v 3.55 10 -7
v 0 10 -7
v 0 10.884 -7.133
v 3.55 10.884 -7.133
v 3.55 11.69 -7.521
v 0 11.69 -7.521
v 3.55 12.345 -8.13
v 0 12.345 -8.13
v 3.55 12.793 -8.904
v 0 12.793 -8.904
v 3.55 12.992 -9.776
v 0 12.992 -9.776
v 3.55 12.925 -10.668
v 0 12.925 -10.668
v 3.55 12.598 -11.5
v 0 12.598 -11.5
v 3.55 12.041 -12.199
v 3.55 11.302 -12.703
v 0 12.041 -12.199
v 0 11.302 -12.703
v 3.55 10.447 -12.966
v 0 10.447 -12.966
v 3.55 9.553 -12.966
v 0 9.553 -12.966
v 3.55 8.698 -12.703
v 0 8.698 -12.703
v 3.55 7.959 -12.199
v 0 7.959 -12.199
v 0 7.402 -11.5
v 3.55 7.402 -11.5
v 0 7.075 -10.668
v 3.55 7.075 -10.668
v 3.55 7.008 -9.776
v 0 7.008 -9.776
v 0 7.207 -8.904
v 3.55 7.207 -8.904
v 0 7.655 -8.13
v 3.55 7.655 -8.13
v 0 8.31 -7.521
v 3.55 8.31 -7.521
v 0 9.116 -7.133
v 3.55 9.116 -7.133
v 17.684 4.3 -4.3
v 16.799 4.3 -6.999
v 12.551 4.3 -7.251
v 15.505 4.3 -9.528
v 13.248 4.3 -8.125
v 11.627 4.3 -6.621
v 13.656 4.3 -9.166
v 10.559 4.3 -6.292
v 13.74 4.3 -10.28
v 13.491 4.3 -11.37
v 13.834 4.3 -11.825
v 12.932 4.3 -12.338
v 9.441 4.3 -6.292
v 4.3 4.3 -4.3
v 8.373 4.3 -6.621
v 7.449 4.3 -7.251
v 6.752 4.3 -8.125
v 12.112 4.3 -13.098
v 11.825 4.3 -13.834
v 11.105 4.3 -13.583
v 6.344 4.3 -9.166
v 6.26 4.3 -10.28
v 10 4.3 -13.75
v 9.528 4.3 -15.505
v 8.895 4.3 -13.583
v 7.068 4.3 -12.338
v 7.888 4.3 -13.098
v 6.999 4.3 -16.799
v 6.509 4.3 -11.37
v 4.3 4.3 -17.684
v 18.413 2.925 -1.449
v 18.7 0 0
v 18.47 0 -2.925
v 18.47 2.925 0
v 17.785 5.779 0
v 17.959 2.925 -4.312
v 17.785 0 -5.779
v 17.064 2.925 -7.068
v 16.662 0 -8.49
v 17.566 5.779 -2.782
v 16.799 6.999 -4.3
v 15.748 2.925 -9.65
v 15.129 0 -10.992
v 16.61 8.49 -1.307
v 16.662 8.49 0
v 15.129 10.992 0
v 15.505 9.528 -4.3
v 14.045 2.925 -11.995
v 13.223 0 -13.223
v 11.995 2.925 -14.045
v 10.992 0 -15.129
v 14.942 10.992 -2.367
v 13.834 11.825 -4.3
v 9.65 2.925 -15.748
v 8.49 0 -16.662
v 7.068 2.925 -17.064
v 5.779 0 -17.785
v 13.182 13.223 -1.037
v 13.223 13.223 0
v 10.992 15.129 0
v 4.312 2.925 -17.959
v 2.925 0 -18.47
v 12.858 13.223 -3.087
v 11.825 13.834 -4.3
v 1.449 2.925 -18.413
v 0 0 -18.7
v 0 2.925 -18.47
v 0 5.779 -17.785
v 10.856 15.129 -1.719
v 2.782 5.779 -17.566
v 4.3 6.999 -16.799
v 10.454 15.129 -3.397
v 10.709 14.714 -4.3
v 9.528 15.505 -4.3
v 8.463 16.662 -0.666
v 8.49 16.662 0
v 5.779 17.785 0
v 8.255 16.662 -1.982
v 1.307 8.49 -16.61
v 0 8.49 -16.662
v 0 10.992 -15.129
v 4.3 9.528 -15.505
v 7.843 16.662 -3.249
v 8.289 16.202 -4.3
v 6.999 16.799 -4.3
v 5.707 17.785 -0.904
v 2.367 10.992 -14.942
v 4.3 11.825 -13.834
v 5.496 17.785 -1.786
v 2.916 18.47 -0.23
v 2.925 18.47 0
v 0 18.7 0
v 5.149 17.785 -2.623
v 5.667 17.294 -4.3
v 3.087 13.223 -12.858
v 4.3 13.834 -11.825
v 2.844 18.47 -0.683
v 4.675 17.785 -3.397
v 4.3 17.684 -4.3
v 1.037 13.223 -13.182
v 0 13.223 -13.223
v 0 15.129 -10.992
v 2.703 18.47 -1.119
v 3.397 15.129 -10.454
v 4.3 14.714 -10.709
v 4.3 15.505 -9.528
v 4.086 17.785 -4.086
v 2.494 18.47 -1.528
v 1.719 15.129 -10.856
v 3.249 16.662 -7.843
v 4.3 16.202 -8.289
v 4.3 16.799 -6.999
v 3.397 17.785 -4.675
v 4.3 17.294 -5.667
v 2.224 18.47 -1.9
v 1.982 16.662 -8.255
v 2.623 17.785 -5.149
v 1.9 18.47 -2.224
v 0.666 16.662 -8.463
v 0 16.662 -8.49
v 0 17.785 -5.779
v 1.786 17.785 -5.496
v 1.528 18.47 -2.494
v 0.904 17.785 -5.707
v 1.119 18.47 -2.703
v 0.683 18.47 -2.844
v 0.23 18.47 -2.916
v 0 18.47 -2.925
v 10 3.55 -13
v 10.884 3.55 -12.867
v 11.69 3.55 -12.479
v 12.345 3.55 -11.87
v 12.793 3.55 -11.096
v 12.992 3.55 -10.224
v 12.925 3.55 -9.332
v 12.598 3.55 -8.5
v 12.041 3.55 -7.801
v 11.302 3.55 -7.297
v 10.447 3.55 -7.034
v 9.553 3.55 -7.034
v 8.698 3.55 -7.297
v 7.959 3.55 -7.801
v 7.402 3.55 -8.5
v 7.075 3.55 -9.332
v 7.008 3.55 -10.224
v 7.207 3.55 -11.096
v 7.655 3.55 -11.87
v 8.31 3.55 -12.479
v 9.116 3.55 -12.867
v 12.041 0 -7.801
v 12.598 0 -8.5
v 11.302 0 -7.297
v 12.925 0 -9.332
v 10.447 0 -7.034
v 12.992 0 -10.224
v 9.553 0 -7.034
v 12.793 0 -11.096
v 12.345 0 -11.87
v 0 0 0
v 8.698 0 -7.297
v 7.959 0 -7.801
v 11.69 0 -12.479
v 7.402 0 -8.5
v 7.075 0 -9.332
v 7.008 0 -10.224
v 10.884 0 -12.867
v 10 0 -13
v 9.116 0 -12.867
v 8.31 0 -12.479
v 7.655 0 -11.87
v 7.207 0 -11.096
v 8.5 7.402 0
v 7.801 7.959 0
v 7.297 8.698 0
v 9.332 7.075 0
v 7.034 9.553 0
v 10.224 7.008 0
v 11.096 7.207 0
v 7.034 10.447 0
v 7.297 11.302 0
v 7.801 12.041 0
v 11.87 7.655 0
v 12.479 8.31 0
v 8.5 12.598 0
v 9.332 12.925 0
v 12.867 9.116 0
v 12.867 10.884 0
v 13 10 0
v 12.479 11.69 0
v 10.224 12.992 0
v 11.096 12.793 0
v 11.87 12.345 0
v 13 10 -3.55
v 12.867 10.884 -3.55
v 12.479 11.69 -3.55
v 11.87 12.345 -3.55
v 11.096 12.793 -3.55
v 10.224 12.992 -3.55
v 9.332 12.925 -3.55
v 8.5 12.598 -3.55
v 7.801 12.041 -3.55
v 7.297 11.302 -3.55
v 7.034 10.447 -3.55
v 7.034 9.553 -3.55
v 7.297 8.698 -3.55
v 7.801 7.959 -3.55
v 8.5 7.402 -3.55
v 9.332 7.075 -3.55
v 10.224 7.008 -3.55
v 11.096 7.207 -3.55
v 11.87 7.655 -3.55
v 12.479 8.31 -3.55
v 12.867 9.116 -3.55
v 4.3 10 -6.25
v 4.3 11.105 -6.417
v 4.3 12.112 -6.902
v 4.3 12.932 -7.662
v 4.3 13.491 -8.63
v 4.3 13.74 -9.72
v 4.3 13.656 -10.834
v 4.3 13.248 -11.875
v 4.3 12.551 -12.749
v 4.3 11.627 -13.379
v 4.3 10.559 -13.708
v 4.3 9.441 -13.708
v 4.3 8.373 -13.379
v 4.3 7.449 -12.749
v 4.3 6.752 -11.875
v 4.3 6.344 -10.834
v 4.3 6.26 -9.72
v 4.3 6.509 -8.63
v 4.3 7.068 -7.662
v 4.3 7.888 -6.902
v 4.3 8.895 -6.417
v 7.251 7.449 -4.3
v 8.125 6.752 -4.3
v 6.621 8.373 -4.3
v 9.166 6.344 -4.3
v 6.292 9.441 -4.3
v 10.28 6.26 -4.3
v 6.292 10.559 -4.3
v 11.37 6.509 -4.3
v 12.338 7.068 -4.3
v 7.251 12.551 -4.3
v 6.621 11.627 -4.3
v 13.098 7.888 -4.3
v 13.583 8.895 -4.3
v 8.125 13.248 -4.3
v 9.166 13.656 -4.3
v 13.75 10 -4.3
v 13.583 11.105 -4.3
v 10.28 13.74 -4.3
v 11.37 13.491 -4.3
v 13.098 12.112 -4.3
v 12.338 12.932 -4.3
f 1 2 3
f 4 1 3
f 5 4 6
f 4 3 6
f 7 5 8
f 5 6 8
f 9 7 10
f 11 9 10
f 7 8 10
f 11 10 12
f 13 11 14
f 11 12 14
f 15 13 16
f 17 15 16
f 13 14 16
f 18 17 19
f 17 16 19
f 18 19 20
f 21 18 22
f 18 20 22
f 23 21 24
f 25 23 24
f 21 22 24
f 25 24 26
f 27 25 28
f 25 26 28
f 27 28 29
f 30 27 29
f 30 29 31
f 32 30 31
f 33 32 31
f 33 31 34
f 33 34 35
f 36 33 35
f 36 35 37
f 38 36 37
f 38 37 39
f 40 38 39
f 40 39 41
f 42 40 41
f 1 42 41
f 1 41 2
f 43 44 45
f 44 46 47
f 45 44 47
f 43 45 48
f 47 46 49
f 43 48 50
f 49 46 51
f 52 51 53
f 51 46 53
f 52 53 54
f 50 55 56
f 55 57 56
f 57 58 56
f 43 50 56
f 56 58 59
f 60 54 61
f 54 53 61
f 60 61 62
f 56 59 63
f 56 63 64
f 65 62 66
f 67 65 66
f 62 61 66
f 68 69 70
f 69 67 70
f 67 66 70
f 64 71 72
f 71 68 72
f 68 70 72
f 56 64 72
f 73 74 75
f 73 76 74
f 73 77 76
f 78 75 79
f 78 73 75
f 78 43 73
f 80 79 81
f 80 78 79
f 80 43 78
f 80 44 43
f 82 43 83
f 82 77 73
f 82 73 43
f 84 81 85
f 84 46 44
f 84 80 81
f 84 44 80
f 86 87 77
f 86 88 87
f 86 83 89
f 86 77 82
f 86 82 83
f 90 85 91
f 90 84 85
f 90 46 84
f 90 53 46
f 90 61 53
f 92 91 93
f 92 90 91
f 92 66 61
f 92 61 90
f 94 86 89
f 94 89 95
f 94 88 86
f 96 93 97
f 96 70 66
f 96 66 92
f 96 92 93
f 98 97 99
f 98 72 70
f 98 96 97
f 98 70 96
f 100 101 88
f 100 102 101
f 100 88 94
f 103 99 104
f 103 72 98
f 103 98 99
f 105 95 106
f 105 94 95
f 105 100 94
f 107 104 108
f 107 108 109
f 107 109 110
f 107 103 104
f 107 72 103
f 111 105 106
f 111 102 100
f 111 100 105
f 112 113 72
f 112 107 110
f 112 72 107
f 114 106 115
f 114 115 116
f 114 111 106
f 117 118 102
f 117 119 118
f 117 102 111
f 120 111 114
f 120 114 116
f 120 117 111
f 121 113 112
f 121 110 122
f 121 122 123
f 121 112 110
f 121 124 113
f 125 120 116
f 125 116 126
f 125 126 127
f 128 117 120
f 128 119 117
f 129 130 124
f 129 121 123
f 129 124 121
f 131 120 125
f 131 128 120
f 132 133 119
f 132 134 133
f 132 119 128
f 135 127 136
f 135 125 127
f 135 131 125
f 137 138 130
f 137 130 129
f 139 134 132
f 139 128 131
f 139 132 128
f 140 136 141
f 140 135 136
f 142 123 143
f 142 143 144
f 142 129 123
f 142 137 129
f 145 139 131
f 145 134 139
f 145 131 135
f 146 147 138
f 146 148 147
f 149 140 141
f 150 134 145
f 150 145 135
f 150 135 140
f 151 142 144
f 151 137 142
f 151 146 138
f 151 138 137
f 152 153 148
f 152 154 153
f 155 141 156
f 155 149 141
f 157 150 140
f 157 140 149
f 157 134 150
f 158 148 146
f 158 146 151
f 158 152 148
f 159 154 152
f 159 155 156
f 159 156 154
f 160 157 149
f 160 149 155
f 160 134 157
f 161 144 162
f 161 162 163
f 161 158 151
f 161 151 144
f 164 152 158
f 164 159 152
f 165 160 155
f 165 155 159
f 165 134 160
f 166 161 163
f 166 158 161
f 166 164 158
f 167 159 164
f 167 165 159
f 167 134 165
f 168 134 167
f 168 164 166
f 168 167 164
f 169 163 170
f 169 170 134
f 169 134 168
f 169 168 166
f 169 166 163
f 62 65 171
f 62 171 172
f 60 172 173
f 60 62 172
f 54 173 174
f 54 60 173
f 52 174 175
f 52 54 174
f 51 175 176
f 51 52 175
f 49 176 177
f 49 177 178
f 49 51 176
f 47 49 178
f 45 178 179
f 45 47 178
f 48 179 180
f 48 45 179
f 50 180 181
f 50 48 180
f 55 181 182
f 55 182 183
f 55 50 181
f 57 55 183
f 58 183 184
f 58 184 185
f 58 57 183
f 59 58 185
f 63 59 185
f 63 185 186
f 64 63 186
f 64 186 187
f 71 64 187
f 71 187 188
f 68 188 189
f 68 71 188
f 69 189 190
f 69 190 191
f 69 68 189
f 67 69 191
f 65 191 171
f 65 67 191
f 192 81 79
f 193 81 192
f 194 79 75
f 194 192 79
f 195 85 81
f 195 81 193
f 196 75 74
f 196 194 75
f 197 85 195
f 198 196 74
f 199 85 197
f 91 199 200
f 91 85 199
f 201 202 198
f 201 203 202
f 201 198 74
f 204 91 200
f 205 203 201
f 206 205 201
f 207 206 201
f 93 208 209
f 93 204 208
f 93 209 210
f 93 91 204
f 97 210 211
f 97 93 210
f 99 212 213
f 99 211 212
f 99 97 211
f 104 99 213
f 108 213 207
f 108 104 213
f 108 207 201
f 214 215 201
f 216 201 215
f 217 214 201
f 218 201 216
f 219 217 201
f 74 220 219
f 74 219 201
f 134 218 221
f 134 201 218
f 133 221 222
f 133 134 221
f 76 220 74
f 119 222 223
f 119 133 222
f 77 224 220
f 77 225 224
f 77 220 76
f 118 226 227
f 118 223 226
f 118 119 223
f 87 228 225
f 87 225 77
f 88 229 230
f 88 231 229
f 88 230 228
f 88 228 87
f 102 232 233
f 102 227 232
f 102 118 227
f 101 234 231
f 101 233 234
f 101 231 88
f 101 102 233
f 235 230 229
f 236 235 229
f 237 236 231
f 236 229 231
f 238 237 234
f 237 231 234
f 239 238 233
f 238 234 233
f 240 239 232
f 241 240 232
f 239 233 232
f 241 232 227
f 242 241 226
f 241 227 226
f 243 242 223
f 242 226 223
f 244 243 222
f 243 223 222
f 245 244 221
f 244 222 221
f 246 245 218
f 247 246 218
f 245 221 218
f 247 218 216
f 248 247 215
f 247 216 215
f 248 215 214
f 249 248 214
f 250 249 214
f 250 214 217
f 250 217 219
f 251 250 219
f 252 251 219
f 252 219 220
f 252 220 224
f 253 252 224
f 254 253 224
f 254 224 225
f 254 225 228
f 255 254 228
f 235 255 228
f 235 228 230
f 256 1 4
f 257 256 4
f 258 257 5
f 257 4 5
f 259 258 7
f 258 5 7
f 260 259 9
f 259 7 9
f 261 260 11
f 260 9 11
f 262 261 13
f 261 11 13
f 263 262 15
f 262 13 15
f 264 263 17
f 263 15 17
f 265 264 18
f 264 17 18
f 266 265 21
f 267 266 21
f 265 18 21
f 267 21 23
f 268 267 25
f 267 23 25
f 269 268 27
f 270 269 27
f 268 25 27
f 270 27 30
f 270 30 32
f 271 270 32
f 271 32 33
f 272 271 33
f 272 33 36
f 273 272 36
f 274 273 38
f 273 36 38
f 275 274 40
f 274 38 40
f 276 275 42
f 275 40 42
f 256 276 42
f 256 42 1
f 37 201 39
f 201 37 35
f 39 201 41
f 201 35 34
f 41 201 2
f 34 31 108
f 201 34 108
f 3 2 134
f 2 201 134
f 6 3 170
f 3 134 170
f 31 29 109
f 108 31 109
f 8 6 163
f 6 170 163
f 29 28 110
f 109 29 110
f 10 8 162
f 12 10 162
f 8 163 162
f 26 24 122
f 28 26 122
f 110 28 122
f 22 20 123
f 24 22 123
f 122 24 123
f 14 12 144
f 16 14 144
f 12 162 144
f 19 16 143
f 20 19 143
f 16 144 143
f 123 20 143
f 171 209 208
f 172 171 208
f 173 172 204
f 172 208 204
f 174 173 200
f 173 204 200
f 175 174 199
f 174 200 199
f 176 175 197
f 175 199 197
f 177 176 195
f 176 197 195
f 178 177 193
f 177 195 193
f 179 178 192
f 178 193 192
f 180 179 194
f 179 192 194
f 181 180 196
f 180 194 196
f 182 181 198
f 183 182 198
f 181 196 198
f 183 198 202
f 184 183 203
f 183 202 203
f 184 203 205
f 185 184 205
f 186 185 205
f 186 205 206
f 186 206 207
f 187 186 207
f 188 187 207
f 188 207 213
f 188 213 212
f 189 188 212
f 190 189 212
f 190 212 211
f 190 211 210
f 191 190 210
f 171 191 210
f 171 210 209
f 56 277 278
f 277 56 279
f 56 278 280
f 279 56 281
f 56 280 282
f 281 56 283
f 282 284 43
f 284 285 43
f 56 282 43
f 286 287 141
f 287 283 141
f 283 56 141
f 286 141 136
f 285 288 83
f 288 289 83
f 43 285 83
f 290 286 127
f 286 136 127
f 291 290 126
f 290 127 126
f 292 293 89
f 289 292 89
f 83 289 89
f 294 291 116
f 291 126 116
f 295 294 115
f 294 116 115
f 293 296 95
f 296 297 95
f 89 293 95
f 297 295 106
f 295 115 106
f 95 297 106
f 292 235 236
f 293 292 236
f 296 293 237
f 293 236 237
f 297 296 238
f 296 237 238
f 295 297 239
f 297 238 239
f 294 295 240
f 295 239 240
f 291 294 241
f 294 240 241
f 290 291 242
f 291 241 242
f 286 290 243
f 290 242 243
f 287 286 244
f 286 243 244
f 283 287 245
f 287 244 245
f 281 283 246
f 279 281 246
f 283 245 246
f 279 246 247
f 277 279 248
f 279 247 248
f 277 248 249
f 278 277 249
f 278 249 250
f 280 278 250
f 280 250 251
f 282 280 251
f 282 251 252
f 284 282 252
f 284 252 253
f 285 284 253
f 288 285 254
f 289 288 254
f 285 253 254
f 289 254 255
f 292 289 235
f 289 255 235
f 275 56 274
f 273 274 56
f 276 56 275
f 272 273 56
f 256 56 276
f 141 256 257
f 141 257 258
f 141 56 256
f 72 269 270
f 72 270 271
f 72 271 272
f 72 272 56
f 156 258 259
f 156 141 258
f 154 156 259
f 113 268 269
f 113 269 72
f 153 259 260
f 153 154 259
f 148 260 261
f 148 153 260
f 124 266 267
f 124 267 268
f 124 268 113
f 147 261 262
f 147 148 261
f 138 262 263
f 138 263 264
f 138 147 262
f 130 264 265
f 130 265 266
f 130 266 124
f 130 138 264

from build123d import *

# Parameters (mm, degrees)
REVOLVE_1_ANGLE     = 90
SHELL_3_T           = -4.3
SKETCH_1_3_R        = 3
CUT_EXTRUDE_2_DEPTH = 10
SKETCH_3_R          = 3
CUT_EXTRUDE_3_DEPTH = 10
SKETCH_4_R          = 3
CUT_EXTRUDE_4_DEPTH = 10
CHAMFER_1_SIZE      = 0.75


with BuildPart() as part:
    # 草图1 → 旋转1 (revolve)
    with BuildSketch(Plane.XY):
        with BuildLine():
            Line((0, 18.7), (0, 0))
            Line((0, 0), (18.7, 0))
            ThreePointArc((18.7, 0), (13.222896808, 13.222896808), (0, 18.7))
        make_face()
    revolve(axis=Axis((0, 0, 0), (0, 1, 0)), revolution_arc=REVOLVE_1_ANGLE)

    # 抽壳3
    shell_3_openings = [part.faces().sort_by_distance(p)[0] for p in [
        (9.35, 13.222896808, -9.35),
    ]]
    offset(amount=SHELL_3_T, openings=shell_3_openings, kind=Kind.INTERSECTION)

    # 草图1<3> → 切除-拉伸2 (cut)
    with BuildSketch(Plane.XY):
        with Locations((10, 10)):
            Circle(SKETCH_1_3_R)
    extrude(amount=-CUT_EXTRUDE_2_DEPTH, mode=Mode.SUBTRACT)

    # 草图3 → 切除-拉伸3 (cut)
    with BuildSketch(Plane.XZ):
        with Locations((10, -10)):
            Circle(SKETCH_3_R)
    extrude(amount=-CUT_EXTRUDE_3_DEPTH, mode=Mode.SUBTRACT)

    # 草图4 → 切除-拉伸4 (cut)
    with BuildSketch(Plane.ZY):
        with Locations((-10, 10)):
            Circle(SKETCH_4_R)
    extrude(amount=-CUT_EXTRUDE_4_DEPTH, mode=Mode.SUBTRACT)

    # 倒角1
    chamfer_1_edges = [part.edges().sort_by_distance(p)[0] for p in [
        (7, 10, -4.3),
        (7, 4.3, -10),
        (4.3, 10, -13),
    ]]
    chamfer(chamfer_1_edges, length=CHAMFER_1_SIZE)


solid = part.part
